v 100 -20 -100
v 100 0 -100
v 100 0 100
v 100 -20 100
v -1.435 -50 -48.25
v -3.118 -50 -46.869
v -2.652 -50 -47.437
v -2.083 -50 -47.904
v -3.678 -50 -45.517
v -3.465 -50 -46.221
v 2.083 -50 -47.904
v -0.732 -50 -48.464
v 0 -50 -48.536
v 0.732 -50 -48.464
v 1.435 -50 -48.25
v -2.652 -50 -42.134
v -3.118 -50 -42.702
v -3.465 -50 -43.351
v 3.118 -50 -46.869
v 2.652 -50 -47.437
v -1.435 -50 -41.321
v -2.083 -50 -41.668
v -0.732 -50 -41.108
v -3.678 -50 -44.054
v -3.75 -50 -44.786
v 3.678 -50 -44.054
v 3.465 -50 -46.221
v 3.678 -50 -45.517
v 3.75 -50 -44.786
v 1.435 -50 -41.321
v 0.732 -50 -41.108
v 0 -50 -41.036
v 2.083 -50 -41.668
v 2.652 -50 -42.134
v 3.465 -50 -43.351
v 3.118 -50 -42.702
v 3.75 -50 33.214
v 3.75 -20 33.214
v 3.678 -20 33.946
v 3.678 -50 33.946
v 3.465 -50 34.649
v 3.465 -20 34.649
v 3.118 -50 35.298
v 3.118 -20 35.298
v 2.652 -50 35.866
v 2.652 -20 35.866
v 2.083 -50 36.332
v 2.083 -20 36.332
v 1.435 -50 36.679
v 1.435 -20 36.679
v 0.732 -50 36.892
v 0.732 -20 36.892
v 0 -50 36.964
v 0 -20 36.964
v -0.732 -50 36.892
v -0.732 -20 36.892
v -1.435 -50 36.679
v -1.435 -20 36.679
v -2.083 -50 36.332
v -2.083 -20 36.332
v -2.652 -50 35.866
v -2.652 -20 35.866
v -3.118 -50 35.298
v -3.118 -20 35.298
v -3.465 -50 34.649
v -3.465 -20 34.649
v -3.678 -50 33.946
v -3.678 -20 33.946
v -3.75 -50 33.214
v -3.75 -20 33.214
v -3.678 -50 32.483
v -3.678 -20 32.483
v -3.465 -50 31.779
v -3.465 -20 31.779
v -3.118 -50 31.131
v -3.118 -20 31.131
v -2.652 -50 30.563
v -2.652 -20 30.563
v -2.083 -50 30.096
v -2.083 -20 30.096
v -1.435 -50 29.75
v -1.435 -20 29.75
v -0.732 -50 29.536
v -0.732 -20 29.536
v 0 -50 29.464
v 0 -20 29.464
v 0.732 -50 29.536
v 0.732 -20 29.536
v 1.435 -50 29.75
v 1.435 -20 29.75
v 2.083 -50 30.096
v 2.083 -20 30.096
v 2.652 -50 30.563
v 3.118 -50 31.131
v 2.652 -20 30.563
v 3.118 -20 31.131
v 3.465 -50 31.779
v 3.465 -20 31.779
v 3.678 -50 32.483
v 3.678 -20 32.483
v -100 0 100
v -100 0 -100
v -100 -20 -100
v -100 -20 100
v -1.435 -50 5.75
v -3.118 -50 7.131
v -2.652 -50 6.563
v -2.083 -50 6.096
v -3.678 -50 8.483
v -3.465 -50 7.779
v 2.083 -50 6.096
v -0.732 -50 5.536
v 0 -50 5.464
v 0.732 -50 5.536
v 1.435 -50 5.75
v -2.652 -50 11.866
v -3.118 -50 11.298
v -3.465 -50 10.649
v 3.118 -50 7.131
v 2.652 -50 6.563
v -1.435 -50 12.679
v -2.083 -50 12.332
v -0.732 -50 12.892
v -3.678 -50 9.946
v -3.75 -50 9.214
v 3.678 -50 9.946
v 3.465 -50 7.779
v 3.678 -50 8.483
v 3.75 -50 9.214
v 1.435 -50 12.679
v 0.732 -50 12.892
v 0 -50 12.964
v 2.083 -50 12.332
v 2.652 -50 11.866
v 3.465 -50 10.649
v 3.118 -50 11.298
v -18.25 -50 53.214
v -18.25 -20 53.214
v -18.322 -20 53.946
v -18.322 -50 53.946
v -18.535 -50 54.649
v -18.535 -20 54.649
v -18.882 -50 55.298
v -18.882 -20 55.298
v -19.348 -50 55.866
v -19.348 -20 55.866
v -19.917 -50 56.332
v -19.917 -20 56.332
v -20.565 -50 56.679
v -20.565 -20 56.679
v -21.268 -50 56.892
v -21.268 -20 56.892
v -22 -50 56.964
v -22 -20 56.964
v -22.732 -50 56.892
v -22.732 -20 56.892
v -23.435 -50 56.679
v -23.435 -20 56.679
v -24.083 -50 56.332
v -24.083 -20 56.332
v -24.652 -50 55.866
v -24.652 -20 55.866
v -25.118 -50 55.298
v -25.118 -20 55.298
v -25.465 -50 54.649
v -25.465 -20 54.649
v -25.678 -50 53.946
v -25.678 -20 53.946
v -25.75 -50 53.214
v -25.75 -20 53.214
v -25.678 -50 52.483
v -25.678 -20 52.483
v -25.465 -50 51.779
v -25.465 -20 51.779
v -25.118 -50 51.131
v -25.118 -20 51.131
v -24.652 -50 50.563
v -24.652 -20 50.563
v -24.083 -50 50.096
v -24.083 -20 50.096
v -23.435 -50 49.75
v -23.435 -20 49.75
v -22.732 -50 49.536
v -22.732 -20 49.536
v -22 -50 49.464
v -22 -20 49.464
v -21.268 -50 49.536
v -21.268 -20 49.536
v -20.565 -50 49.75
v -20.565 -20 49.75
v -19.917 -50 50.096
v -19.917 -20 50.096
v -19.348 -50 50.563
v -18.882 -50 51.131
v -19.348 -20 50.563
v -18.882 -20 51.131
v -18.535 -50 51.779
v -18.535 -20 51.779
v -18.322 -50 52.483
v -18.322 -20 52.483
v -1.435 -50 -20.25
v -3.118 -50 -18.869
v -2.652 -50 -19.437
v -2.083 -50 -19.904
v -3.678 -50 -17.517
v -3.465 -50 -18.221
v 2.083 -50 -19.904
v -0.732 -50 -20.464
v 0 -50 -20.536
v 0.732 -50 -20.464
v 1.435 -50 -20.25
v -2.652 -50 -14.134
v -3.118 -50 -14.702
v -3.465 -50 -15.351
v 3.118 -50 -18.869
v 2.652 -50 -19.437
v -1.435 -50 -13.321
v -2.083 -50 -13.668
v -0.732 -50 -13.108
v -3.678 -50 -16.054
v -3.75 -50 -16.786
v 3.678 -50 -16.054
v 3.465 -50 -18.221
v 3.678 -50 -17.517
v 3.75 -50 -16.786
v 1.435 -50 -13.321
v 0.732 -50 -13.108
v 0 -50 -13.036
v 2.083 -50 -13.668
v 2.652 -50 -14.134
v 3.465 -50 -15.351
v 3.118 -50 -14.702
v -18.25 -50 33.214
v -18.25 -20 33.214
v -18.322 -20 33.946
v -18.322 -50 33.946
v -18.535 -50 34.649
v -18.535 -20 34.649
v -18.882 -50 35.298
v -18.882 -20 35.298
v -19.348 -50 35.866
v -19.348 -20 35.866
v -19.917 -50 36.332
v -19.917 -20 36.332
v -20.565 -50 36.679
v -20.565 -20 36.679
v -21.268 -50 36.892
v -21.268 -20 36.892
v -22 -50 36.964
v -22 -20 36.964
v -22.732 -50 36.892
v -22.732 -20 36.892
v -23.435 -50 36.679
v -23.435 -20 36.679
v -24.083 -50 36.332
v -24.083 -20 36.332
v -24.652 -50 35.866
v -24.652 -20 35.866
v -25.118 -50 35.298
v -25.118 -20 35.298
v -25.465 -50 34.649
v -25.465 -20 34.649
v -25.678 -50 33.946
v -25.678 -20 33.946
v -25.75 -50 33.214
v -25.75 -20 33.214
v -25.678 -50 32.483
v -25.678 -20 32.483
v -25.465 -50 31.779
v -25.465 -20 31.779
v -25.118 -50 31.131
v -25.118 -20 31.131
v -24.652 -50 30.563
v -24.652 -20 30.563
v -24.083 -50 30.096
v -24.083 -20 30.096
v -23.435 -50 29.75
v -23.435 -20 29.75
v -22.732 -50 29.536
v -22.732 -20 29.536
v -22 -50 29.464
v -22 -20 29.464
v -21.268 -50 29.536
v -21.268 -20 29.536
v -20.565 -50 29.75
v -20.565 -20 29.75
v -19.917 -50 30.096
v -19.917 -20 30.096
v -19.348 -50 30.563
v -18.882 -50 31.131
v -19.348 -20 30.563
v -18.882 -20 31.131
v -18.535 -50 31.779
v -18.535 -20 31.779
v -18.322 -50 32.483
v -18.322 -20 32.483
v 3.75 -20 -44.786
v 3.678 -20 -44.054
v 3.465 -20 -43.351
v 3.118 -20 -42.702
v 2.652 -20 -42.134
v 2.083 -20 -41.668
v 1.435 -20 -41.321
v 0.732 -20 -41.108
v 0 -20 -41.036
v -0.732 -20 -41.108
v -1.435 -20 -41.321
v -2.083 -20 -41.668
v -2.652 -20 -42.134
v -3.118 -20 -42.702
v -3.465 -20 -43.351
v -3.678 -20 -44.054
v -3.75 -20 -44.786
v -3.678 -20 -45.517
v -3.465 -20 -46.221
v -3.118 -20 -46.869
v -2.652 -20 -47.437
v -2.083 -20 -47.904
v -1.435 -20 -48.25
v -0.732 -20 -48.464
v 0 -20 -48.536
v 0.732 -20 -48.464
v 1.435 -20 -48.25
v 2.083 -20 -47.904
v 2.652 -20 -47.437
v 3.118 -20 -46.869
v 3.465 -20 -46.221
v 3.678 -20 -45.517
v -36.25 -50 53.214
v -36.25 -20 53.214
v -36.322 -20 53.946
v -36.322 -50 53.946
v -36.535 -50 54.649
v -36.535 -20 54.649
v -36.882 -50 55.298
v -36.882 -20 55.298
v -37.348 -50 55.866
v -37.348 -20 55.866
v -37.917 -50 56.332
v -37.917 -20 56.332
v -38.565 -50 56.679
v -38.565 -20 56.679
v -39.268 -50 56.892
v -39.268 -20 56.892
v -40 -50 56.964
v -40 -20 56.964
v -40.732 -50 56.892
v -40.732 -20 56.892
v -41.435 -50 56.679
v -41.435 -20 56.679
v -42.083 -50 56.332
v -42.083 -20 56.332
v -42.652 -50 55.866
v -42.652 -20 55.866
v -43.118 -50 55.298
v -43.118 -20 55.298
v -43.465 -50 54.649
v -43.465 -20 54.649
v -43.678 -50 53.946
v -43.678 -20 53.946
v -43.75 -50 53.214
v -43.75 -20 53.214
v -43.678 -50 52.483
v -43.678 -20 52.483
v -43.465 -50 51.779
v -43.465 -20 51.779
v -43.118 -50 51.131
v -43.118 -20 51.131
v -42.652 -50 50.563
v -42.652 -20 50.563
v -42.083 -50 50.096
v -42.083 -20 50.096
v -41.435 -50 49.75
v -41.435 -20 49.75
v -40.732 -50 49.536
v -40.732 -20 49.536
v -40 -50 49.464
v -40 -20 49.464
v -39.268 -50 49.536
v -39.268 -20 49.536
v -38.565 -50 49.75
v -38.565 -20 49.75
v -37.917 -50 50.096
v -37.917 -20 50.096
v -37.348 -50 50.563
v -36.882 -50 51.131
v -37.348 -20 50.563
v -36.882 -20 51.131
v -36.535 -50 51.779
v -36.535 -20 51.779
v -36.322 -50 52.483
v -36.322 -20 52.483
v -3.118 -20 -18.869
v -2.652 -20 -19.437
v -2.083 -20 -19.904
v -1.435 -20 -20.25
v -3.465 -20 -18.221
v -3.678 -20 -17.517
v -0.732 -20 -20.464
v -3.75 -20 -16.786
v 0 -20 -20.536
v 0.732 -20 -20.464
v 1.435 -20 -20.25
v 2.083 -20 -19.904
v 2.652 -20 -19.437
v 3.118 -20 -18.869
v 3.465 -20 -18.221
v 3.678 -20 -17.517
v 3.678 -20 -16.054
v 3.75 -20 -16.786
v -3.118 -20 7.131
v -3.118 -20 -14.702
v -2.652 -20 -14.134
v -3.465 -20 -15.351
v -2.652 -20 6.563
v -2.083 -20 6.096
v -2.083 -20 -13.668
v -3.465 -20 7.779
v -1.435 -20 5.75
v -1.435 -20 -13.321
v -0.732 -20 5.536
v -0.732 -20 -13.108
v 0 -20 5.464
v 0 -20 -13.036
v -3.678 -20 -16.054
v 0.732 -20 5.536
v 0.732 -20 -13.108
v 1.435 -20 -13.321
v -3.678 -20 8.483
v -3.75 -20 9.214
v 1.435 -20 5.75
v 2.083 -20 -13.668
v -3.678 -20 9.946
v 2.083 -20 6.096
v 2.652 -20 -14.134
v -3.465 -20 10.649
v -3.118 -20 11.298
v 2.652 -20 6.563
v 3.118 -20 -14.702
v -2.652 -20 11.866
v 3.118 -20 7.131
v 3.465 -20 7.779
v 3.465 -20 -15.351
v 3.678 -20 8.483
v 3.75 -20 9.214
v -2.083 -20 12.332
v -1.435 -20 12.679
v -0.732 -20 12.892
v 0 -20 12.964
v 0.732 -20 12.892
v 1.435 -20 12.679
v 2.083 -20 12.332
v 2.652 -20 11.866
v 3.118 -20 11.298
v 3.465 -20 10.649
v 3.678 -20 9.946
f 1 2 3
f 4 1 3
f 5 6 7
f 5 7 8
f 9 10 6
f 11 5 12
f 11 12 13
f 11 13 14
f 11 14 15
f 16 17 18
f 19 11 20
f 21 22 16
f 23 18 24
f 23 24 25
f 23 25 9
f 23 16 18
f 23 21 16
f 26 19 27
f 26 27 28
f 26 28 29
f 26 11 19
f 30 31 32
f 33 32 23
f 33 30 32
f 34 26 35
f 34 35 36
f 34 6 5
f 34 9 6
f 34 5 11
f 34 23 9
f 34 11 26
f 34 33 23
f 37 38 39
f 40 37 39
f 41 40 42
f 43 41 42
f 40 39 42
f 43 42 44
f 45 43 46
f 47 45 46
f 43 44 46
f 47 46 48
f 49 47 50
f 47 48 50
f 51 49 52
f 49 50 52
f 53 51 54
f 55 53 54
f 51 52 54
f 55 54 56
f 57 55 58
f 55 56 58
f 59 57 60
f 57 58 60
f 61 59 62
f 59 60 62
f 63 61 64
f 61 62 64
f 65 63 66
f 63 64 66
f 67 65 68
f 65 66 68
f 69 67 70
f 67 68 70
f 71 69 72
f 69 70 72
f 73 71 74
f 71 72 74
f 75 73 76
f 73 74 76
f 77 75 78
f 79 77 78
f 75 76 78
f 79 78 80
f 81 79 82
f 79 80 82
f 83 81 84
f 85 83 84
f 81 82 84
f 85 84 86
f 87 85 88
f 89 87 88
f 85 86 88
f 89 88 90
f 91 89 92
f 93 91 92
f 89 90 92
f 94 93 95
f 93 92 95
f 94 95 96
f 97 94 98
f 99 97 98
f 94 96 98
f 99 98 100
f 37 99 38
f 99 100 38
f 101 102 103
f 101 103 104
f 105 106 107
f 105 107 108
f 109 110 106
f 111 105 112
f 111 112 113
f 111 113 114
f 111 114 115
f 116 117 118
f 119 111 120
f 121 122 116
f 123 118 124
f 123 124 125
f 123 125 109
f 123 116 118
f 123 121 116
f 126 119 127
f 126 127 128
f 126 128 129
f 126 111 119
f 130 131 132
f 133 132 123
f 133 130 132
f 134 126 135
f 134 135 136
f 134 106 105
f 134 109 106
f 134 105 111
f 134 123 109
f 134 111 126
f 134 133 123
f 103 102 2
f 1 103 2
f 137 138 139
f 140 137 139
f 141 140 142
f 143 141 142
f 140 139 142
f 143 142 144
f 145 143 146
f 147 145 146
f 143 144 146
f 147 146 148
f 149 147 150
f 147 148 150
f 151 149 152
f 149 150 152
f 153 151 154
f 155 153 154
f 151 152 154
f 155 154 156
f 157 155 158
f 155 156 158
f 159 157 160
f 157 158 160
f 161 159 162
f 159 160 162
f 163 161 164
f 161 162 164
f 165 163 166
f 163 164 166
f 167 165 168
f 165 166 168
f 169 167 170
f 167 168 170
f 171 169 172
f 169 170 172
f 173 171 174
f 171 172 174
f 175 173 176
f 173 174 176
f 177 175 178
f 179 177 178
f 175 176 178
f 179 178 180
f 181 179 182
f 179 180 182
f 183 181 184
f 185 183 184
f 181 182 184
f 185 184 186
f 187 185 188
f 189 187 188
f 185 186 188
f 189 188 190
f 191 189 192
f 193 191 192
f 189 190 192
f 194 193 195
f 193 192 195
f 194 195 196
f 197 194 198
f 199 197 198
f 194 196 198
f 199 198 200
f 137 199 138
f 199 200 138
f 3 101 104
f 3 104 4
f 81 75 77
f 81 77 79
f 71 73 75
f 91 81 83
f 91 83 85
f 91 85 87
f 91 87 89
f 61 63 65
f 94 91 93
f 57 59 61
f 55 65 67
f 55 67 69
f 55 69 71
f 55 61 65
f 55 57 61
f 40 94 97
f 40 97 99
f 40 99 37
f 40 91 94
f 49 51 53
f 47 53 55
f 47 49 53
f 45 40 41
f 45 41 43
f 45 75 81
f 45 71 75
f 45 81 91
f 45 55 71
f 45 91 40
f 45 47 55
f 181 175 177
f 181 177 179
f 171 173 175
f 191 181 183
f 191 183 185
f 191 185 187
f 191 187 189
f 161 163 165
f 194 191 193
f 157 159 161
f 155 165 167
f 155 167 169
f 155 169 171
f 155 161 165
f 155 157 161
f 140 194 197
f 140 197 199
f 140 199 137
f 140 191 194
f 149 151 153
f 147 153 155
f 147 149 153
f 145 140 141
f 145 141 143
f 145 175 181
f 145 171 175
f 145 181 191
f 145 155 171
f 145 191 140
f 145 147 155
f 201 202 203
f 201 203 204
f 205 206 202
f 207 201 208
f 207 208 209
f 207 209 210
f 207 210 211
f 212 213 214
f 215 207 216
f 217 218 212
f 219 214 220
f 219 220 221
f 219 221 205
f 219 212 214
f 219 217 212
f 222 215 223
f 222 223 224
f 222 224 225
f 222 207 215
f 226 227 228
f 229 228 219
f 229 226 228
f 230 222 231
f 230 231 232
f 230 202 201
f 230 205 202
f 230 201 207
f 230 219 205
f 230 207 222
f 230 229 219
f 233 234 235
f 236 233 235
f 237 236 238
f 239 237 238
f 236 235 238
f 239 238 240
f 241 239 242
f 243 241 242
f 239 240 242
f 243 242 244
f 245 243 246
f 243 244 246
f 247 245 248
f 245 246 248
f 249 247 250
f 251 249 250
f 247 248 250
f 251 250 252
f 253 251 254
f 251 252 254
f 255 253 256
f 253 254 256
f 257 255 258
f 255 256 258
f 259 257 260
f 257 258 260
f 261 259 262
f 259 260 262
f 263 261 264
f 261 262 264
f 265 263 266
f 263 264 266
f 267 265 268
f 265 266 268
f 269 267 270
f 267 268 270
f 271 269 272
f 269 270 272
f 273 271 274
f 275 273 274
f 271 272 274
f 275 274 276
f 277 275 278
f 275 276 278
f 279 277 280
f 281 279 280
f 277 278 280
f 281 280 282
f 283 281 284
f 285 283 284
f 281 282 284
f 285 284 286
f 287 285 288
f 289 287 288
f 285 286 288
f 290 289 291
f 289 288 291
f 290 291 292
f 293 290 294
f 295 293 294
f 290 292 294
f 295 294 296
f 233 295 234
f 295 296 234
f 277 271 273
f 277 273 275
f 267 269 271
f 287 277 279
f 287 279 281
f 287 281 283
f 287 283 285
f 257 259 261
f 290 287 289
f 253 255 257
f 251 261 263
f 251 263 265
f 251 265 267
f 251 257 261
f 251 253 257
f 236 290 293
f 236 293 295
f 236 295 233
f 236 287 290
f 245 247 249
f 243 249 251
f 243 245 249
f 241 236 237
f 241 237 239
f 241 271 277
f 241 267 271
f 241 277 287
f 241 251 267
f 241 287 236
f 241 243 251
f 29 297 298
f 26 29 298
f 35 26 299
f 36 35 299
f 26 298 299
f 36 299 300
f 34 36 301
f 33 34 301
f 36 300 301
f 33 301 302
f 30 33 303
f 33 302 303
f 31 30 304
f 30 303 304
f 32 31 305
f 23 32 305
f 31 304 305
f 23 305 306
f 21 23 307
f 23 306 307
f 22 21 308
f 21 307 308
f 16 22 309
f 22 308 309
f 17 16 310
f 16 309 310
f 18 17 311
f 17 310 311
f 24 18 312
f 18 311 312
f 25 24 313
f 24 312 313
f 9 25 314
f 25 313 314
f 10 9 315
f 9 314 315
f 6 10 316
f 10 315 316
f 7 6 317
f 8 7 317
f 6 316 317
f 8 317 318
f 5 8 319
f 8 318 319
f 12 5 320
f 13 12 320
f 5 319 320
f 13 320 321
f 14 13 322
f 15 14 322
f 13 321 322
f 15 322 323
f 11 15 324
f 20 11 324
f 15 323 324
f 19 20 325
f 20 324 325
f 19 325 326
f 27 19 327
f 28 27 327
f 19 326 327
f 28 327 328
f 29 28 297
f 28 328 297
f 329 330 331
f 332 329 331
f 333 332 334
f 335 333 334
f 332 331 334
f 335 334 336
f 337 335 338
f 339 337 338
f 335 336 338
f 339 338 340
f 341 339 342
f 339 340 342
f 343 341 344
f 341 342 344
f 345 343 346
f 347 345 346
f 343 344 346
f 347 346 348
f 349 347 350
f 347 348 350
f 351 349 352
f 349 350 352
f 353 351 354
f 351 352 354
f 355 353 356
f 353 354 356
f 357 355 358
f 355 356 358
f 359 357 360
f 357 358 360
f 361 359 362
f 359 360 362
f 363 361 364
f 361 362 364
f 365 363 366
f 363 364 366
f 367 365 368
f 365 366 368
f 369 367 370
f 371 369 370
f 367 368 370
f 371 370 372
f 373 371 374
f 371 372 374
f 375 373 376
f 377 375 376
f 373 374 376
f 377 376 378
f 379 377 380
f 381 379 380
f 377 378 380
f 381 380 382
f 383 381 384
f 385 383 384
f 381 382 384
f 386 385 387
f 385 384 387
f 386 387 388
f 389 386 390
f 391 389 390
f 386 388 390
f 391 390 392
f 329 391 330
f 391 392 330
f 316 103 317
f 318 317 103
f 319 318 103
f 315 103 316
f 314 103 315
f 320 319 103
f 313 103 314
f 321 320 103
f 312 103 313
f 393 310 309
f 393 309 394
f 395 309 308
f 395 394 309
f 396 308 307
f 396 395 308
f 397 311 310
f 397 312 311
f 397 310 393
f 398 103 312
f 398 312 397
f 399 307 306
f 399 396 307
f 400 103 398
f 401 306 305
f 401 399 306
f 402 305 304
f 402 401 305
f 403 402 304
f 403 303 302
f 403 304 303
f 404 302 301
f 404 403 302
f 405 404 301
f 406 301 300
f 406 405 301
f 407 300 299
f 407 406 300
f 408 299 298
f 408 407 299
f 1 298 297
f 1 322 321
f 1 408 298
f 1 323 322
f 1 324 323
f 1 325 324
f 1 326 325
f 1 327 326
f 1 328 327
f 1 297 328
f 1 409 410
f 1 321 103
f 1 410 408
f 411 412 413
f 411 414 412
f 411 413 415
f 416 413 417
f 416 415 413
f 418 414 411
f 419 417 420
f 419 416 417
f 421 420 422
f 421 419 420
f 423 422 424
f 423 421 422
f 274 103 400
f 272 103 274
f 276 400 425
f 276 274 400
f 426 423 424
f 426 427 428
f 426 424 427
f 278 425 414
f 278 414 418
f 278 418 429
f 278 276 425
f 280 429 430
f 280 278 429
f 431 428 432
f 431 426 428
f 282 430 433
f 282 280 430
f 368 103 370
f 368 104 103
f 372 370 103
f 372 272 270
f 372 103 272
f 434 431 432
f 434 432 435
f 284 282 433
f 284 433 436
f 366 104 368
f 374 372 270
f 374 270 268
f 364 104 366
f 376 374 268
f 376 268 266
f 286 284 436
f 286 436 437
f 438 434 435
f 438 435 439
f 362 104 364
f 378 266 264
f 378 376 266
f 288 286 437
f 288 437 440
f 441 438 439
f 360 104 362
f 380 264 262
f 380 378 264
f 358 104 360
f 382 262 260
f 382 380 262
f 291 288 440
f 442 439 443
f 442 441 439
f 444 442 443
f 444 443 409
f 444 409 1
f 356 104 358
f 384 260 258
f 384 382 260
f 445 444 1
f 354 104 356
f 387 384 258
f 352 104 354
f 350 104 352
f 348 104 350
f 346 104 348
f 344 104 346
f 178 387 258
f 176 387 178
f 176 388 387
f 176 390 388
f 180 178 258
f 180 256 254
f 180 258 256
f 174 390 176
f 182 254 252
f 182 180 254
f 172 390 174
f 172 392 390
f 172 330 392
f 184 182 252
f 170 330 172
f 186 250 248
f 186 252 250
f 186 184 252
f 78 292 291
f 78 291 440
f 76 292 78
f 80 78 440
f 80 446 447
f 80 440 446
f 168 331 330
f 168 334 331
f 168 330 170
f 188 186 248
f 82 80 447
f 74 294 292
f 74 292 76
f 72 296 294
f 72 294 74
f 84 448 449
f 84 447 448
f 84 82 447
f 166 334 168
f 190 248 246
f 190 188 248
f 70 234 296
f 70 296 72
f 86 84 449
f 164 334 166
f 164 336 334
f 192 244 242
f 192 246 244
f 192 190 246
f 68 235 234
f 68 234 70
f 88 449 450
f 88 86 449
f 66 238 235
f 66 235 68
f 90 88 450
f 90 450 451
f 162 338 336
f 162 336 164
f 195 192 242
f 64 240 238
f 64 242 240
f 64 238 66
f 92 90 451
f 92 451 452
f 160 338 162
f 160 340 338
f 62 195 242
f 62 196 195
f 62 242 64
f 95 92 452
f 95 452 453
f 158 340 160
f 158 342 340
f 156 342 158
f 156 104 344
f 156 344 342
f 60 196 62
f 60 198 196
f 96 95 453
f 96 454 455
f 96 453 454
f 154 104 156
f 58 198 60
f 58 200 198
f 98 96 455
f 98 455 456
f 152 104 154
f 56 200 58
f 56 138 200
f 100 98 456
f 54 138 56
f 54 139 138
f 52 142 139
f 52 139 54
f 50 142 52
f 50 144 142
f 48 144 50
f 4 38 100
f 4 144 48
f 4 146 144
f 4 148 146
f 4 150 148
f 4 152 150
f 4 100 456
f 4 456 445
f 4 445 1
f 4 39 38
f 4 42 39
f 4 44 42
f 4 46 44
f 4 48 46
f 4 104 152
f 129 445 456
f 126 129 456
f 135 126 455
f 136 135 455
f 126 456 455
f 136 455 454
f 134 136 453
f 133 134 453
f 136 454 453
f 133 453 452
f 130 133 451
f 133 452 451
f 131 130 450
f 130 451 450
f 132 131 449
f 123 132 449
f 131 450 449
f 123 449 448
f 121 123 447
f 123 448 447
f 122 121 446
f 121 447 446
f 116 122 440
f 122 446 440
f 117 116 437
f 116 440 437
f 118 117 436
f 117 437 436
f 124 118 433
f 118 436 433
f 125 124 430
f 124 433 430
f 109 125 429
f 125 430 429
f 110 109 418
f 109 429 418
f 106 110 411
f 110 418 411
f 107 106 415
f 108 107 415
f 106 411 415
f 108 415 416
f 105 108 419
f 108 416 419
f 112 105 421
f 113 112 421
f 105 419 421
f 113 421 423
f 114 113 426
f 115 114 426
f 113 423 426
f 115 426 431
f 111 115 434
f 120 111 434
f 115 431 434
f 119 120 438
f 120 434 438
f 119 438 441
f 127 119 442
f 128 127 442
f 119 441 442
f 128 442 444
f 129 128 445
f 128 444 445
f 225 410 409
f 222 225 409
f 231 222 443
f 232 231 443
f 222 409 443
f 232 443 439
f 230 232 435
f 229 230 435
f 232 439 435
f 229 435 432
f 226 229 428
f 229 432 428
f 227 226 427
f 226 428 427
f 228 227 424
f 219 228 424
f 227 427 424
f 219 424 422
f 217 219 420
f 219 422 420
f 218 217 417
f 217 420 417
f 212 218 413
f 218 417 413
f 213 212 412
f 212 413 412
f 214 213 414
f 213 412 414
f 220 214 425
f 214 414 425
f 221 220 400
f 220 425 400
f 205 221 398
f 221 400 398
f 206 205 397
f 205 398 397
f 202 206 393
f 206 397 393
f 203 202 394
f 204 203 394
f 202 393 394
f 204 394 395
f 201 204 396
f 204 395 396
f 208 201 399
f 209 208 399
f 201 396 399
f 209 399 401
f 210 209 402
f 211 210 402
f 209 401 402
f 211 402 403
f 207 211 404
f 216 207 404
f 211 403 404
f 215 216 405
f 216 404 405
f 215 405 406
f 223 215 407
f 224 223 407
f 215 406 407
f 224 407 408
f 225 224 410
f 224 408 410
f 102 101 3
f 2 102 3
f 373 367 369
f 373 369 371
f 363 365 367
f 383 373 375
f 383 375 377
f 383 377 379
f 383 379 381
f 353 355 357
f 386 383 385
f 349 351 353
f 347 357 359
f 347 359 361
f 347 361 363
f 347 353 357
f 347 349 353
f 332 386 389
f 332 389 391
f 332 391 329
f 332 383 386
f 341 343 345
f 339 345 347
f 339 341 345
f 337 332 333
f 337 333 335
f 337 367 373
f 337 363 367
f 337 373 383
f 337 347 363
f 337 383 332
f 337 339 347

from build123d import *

# Parameters (mm, degrees)
F0_W     = 200
F0_H     = 200
F1_DEPTH = 20
F2_R     = 3.75
F3_DEPTH = 30


with BuildPart() as f1:
    # F0 (on Front) → F1 (new body)
    with BuildSketch(Plane.XZ):
        Rectangle(F0_W, F0_H)
    extrude(amount=F1_DEPTH)

    # F2 (on face) → F3 (join)
    with BuildSketch(Plane.XZ.offset(20)):
        with Locations((-40, 53.214375)):
            Circle(F2_R)
        with Locations((-22, 53.214375)):
            Circle(F2_R)
        with Locations((-22, 33.214375)):
            Circle(F2_R)
        with Locations((0, 33.214375)):
            Circle(F2_R)
        with Locations((0, 9.214375)):
            Circle(F2_R)
        with Locations((0, -16.785625)):
            Circle(F2_R)
        with Locations((0, -44.785625)):
            Circle(F2_R)
    extrude(amount=F3_DEPTH)


solid = f1.part
